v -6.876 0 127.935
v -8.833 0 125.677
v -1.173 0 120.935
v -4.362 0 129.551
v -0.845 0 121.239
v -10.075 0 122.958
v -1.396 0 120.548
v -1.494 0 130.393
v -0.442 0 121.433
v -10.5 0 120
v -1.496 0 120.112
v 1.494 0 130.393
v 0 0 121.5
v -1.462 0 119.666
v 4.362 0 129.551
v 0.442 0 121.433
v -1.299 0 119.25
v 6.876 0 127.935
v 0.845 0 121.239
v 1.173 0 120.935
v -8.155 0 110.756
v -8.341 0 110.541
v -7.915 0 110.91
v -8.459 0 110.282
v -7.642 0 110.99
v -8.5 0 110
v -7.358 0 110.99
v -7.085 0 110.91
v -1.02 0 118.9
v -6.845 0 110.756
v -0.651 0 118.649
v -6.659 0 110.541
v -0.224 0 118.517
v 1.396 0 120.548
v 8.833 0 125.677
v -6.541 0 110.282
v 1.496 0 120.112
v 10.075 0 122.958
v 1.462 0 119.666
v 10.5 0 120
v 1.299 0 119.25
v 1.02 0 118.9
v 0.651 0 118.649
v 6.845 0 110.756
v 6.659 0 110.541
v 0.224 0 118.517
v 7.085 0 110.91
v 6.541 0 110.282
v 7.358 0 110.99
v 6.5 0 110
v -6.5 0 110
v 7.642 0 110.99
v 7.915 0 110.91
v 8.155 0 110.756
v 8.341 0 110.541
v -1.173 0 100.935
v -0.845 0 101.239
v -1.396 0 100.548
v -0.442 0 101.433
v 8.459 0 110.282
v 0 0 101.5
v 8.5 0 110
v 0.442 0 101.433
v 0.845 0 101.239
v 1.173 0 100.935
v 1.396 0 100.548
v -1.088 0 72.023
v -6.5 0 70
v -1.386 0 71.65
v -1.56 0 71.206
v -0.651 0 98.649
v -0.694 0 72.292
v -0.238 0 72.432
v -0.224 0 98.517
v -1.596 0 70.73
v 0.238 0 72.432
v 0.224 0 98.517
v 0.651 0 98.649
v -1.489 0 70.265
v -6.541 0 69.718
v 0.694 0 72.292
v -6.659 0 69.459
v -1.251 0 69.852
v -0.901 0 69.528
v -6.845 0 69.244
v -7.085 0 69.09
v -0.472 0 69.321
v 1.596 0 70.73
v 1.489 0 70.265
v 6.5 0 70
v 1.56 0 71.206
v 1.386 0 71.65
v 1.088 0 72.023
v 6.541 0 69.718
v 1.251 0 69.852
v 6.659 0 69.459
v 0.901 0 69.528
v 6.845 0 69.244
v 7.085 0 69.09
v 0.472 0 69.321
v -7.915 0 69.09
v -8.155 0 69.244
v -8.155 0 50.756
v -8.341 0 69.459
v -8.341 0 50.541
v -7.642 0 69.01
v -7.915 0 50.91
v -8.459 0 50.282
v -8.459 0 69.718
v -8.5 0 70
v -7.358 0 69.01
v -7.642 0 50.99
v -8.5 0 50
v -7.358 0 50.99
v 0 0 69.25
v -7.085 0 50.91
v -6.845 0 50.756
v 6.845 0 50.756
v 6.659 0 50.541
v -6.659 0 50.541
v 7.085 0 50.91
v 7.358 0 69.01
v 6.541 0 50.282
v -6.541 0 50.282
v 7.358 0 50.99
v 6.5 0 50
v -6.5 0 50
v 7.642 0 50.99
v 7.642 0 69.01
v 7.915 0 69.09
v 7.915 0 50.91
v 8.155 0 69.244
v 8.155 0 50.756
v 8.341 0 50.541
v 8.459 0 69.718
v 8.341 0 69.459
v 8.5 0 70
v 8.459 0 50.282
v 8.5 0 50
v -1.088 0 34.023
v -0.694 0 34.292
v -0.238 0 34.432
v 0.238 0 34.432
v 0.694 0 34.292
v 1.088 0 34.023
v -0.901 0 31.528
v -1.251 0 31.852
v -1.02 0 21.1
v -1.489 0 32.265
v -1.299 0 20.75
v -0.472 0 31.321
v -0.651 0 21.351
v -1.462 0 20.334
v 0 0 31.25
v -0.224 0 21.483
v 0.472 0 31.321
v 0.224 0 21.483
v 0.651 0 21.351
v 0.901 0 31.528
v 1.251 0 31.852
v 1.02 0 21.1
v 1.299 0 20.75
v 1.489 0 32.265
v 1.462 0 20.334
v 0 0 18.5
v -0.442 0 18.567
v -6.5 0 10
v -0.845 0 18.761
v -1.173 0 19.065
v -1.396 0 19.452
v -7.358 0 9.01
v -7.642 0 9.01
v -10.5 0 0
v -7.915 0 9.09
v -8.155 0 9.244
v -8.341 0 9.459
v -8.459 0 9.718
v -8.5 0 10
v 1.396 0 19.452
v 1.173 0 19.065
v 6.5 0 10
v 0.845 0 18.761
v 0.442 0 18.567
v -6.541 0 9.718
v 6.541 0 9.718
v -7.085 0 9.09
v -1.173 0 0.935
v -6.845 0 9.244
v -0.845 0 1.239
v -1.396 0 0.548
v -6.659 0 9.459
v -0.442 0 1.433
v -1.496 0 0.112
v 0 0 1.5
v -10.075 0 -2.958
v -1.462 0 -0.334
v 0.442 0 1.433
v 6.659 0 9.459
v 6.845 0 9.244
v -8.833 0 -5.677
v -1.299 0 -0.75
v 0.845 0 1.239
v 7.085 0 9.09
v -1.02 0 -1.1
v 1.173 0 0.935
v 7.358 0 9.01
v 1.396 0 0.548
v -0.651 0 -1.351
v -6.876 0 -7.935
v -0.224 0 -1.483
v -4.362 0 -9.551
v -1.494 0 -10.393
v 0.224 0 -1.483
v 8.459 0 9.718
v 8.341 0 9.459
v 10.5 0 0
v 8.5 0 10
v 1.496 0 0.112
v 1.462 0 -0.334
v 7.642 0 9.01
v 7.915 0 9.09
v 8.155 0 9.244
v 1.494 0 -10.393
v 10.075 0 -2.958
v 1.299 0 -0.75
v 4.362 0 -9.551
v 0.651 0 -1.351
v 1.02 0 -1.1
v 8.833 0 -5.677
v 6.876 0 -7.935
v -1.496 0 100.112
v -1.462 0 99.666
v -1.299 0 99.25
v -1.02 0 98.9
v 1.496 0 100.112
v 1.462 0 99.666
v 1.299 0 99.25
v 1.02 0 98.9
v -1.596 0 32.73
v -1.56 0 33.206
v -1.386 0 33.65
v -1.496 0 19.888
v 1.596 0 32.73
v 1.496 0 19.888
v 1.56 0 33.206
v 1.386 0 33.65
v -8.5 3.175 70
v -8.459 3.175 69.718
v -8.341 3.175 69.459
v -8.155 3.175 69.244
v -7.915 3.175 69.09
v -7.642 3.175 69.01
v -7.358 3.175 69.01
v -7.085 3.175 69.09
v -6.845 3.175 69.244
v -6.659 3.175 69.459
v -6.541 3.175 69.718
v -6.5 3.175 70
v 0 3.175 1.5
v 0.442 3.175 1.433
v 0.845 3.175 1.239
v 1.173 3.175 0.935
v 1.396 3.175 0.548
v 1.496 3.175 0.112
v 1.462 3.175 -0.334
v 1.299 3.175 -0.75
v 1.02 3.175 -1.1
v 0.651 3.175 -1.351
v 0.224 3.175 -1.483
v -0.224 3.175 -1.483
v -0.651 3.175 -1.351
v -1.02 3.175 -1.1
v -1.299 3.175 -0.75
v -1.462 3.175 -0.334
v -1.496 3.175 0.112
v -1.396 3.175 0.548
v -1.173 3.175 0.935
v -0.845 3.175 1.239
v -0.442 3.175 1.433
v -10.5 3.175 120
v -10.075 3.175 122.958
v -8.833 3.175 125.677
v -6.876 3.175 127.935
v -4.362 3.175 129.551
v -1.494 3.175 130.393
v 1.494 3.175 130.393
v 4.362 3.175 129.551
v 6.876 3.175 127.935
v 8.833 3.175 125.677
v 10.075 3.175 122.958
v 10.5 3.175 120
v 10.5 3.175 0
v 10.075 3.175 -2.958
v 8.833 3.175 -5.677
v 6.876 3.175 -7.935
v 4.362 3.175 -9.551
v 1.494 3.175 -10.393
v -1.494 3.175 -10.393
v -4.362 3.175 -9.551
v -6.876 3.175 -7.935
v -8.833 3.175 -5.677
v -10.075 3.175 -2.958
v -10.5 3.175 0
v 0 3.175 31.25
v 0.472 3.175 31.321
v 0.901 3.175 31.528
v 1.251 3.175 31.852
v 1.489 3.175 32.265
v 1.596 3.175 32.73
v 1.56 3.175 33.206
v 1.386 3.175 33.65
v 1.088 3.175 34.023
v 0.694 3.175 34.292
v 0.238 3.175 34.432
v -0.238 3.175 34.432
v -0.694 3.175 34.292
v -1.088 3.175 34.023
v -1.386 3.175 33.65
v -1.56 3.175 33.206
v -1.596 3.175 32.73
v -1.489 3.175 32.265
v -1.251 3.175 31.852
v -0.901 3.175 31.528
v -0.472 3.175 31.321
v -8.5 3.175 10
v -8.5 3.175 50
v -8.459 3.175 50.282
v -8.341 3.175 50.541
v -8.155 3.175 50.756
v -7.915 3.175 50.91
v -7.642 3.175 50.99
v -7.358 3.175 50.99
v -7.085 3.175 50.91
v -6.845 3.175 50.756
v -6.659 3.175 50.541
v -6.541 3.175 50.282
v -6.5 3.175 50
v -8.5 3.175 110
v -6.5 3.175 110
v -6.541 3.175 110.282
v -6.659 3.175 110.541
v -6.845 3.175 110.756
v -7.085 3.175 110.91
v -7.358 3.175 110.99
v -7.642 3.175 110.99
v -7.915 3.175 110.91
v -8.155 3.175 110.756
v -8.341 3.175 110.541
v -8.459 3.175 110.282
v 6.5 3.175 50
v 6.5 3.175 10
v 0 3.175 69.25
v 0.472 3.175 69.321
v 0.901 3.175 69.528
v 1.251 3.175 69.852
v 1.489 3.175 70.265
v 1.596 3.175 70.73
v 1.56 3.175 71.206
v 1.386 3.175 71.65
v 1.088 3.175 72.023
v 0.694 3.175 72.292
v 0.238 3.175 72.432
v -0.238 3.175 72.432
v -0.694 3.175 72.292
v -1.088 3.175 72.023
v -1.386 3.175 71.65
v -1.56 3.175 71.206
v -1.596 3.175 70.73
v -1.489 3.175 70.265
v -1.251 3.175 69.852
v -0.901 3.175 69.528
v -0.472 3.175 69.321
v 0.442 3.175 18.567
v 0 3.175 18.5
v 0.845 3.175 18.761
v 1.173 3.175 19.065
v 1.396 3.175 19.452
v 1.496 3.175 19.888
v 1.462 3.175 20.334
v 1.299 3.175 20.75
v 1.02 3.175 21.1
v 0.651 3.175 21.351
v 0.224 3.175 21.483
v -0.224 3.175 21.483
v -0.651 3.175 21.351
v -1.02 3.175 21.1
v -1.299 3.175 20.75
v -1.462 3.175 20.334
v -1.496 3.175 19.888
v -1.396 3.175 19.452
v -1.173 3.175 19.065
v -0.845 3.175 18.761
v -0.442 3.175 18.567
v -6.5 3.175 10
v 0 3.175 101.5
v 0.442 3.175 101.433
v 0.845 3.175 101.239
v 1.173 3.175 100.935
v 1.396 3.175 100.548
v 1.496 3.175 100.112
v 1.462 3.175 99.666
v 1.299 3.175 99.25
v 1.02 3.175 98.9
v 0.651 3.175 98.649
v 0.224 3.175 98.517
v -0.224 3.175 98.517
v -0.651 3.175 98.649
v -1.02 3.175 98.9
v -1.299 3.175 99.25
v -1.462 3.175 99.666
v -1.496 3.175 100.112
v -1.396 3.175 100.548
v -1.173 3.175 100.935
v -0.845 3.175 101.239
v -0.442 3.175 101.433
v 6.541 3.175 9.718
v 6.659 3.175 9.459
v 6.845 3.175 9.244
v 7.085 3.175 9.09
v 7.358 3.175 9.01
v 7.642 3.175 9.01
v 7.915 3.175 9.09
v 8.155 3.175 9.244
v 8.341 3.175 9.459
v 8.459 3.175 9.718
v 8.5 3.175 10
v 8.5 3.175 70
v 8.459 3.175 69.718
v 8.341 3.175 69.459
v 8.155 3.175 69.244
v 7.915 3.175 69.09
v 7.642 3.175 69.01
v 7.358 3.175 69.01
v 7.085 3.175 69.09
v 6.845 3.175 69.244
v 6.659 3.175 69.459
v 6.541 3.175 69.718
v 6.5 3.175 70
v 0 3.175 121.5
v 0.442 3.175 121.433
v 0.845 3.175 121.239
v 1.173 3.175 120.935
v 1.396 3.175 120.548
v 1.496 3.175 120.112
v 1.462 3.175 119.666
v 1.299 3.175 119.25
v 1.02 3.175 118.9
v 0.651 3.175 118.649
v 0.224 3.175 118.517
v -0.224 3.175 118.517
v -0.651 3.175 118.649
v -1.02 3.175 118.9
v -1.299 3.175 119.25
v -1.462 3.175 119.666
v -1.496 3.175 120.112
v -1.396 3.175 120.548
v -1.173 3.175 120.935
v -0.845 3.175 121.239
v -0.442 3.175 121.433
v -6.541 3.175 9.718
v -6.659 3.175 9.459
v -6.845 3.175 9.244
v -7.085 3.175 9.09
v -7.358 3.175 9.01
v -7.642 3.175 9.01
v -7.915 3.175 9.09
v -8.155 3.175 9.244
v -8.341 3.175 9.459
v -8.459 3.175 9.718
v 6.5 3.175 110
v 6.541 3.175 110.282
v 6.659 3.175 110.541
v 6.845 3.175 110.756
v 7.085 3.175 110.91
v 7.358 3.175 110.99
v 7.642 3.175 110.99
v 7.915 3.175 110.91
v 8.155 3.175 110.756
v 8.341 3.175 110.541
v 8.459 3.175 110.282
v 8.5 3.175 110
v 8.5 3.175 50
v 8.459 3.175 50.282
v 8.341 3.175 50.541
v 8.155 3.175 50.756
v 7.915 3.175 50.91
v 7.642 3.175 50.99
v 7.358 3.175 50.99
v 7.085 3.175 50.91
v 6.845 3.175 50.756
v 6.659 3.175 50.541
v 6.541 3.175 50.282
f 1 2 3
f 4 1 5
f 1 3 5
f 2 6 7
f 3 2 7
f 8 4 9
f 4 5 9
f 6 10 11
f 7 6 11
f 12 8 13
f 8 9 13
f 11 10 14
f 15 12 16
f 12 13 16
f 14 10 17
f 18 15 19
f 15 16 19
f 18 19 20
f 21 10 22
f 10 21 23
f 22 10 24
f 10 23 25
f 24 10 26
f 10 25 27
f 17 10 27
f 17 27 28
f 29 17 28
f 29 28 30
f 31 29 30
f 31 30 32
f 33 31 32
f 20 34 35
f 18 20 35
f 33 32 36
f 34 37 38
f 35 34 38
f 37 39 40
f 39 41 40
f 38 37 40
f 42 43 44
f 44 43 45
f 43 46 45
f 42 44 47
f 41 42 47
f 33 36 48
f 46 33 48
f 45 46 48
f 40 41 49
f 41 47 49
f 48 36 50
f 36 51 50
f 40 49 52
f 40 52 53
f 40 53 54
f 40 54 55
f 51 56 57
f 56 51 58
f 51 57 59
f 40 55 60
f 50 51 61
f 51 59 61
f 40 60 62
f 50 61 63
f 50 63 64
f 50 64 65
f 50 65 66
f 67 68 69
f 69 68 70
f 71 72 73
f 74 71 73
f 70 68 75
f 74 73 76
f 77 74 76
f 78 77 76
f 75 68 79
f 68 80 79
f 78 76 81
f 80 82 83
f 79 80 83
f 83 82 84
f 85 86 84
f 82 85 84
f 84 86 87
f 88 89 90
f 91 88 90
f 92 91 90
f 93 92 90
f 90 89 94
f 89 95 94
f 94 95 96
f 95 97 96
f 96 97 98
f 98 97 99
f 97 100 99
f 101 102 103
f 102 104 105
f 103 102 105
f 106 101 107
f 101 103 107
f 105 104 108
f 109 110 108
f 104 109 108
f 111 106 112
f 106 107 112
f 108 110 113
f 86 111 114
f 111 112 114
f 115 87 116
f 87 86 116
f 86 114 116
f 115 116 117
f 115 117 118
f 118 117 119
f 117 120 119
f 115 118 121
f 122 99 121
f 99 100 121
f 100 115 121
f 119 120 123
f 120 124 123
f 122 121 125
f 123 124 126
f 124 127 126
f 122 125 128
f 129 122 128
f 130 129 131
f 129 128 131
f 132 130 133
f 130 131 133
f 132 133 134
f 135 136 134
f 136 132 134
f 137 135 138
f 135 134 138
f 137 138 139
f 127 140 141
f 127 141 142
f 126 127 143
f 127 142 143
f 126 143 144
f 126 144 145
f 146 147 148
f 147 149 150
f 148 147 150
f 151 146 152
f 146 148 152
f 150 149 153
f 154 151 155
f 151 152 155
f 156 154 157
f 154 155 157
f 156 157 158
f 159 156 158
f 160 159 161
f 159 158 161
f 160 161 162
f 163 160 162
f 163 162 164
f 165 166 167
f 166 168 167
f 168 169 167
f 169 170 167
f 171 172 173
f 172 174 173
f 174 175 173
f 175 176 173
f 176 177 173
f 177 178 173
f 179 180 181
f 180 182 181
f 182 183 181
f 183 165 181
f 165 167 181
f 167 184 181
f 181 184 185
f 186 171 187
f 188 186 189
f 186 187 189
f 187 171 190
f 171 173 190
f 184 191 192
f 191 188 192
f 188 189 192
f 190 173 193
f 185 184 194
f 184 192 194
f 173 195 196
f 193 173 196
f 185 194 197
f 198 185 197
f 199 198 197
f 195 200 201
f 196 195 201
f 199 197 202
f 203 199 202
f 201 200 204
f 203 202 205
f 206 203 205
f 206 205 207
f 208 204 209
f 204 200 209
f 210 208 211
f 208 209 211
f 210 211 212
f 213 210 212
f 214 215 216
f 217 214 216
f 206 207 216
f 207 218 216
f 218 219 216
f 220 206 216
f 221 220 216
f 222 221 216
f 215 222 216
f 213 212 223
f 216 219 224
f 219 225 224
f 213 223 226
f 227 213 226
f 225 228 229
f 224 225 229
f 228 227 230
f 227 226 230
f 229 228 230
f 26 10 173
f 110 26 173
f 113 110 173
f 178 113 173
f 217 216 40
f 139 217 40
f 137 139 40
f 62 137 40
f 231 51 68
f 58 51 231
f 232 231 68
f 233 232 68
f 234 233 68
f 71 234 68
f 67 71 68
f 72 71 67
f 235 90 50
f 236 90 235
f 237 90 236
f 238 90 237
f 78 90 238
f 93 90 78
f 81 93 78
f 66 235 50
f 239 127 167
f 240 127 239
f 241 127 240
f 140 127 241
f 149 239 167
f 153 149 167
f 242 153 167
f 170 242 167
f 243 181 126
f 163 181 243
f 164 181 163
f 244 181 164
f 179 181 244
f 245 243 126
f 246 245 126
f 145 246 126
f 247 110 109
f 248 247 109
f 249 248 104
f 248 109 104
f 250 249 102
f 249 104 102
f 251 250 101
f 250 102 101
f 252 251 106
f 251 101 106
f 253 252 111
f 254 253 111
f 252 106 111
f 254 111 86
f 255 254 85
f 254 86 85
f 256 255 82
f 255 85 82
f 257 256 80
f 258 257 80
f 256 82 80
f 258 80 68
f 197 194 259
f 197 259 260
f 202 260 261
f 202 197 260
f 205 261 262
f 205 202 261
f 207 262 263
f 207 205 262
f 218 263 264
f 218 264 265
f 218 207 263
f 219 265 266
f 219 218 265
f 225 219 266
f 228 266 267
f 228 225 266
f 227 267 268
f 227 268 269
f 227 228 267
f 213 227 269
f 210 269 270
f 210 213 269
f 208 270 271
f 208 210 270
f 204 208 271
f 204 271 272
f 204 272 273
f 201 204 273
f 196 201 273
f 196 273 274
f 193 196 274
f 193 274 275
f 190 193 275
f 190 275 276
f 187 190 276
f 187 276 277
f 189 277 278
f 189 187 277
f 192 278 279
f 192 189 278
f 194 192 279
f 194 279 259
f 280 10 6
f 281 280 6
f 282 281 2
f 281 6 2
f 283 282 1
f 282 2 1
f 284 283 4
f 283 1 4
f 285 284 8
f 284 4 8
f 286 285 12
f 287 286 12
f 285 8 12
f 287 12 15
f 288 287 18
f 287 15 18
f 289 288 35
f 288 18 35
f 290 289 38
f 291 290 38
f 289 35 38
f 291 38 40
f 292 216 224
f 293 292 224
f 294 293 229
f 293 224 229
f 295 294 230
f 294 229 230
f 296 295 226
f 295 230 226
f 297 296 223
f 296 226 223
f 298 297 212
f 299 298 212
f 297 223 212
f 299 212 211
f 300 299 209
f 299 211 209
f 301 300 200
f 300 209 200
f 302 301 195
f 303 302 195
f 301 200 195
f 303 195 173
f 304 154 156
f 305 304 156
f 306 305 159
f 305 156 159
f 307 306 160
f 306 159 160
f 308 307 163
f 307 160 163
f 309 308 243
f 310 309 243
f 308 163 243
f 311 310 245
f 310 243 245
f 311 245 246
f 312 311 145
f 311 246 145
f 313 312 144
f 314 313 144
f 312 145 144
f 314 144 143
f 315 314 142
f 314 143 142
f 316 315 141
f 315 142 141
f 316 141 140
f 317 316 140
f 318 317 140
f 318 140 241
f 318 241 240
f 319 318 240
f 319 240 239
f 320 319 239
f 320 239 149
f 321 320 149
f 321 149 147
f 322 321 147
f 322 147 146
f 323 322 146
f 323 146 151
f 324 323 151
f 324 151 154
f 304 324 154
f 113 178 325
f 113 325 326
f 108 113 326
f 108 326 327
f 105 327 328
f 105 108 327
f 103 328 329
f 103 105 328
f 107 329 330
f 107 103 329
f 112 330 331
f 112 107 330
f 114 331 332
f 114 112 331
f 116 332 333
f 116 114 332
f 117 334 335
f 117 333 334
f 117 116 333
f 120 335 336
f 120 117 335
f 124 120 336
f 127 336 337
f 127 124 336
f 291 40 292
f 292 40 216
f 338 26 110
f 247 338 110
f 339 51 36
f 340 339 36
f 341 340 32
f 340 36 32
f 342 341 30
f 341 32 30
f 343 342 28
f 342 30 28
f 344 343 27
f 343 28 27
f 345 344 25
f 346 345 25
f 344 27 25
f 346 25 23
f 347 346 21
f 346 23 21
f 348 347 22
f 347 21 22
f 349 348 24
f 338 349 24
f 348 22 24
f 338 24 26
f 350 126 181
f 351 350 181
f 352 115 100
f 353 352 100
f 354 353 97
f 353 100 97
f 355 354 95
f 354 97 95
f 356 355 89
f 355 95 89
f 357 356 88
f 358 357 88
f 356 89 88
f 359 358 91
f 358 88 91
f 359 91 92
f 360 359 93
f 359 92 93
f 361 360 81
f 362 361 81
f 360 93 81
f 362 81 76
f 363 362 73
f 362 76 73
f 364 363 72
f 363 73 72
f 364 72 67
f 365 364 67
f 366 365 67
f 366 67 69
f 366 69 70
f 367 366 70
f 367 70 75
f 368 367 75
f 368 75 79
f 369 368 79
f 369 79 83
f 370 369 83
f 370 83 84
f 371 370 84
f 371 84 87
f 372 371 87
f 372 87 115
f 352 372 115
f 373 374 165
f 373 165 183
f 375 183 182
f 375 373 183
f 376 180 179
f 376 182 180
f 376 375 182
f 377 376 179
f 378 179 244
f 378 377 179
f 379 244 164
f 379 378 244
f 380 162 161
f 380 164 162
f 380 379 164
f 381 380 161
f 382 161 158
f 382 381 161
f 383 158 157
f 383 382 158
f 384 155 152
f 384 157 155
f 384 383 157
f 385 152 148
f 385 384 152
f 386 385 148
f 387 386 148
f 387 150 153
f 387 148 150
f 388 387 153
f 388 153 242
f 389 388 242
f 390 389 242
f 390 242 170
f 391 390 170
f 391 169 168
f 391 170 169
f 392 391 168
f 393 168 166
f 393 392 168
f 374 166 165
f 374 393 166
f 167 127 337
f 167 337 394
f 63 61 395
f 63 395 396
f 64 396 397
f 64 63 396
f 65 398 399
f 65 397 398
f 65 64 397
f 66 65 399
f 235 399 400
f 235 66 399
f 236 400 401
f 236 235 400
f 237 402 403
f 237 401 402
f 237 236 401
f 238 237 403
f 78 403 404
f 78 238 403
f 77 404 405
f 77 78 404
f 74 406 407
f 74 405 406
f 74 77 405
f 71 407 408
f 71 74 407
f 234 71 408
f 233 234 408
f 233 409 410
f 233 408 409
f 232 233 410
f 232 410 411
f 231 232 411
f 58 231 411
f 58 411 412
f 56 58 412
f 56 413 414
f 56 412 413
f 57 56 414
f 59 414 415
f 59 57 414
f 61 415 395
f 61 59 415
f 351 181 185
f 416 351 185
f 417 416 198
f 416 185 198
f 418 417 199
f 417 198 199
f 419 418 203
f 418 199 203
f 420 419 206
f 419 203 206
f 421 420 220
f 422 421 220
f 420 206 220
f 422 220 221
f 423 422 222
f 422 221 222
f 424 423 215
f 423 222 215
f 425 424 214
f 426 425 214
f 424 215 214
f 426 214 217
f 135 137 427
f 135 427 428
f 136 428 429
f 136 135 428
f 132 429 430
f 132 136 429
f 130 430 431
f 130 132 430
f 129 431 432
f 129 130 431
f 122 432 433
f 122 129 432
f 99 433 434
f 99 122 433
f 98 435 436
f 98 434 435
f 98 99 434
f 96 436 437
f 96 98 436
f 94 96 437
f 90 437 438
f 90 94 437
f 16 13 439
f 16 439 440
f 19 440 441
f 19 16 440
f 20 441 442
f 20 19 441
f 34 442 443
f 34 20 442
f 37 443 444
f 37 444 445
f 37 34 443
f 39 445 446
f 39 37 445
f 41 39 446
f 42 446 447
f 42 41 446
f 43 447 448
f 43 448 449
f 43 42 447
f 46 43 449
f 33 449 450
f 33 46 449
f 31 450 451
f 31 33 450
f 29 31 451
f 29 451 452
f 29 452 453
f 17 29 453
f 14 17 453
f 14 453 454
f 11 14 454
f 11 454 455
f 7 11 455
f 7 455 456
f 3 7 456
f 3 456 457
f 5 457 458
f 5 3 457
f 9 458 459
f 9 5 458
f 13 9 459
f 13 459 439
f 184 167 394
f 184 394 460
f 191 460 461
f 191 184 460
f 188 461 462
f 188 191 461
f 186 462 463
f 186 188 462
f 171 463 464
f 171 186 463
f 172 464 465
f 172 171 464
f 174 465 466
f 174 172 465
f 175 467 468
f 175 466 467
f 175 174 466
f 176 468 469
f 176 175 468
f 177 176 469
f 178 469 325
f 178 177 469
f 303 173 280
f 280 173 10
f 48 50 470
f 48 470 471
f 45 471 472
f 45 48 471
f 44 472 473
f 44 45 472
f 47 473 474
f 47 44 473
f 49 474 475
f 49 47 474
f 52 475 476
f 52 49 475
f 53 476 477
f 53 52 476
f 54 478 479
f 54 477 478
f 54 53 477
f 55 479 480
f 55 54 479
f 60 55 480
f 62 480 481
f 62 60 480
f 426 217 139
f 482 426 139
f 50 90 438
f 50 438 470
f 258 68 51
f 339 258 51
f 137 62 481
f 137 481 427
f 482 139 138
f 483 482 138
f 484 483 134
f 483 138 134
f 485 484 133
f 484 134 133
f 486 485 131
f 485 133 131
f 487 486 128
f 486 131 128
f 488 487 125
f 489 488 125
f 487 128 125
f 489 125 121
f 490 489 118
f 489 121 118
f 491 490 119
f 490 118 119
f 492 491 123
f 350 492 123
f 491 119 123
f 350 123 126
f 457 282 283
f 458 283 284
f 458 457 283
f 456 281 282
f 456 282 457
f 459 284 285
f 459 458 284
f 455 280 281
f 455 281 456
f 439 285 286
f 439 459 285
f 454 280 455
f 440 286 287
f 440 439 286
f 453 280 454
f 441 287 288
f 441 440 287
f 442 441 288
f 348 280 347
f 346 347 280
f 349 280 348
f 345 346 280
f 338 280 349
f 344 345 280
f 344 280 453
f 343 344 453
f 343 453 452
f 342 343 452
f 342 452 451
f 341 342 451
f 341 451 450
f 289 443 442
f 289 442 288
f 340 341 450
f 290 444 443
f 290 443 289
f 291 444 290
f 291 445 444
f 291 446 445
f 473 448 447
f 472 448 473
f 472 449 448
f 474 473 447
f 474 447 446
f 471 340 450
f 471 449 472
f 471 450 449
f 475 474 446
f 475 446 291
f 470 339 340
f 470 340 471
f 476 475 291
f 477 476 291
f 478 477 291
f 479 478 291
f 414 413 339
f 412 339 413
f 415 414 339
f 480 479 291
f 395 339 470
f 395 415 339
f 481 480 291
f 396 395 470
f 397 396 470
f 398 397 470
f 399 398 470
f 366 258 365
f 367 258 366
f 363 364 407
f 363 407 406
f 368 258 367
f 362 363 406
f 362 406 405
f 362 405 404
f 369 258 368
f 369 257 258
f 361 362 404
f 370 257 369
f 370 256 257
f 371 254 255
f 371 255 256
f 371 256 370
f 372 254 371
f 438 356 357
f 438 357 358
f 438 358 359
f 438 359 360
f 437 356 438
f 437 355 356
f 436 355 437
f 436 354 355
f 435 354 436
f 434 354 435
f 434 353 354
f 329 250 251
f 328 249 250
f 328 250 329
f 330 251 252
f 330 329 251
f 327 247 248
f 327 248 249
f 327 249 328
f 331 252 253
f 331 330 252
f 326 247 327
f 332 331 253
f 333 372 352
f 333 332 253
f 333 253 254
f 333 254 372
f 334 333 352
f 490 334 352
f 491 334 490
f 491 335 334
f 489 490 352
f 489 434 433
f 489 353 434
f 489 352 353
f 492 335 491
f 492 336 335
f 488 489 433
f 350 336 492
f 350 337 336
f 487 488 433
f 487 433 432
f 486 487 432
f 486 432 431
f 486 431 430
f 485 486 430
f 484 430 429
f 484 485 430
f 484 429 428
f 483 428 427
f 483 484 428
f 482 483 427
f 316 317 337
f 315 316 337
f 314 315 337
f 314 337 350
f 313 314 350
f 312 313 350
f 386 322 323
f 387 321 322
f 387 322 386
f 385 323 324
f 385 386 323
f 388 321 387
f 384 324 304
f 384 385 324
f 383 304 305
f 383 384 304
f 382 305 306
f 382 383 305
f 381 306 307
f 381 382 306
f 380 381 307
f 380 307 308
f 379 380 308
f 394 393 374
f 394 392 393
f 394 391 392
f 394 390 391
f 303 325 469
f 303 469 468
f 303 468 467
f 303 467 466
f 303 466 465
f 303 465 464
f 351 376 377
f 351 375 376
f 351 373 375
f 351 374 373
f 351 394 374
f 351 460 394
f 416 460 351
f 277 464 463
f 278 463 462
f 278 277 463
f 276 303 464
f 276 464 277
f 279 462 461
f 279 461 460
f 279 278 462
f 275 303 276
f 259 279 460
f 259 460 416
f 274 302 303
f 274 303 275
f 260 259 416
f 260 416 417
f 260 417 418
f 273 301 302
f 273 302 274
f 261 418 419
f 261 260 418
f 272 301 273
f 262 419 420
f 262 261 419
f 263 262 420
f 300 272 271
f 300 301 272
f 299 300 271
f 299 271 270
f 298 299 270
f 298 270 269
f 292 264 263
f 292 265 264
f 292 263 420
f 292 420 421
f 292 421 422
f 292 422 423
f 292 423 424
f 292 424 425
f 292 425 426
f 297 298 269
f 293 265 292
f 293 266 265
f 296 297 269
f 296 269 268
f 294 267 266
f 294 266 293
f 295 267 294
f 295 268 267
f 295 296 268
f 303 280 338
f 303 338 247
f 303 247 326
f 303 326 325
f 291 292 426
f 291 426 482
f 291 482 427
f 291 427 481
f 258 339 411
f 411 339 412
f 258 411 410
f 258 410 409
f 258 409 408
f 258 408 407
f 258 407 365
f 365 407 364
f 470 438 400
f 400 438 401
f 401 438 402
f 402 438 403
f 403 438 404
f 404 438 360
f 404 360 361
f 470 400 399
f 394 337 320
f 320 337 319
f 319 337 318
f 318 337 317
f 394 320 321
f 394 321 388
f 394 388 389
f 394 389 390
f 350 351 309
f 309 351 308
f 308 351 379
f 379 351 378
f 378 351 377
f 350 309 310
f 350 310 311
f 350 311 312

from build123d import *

# Parameters (mm, degrees)
SKETCH1_R               = 1.5
BOSS_EXTRUDE1_DEPTH     = 3.175
CUT_EXTRUDE1_DEPTH      = 131.960225355
CUT_EXTRUDE1_DEPTH_BACK = 131.960225355
SKETCH2_R               = 1.5
CUT_EXTRUDE2_DEPTH      = 131.960225355
CUT_EXTRUDE2_DEPTH_BACK = 131.960225355
SKETCH3_R               = 1.5
CUT_EXTRUDE4_DEPTH      = 40
SKETCH6_R               = 1.6
CUT_EXTRUDE5_DEPTH      = 10


with BuildPart() as part:
    # Sketch1 → Boss-Extrude1 (new body)
    with BuildSketch(Plane(origin=(0, 0, 0), x_dir=(1, 0, 0), z_dir=(0, 1, 0))):
        with BuildLine():
            Line((-10.5, 0), (-10.5, -120))
            ThreePointArc((-10.5, -120), (0, -130.5), (10.5, -120))
            Line((10.5, -120), (10.5, 0))
            ThreePointArc((10.5, 0), (0, 10.5), (-10.5, 0))
        make_face()
        with Locations(Location((0, 0, 0), (0, 0, 270))):
            Circle(SKETCH1_R, mode=Mode.SUBTRACT)
        with Locations(Location((0, -120, 0), (0, 0, 270))):
            Circle(SKETCH1_R, mode=Mode.SUBTRACT)
    extrude(amount=BOSS_EXTRUDE1_DEPTH)

    # Sketch2 → Cut-Extrude1 (cut, two sides: drawn at the far end of the back side and taken through both)
    with BuildSketch(Plane.XZ.offset(-CUT_EXTRUDE1_DEPTH_BACK)):
        with Locations(Location((0, 20, 0), (0, 0, 270))):
            Circle(SKETCH2_R)
    extrude(amount=CUT_EXTRUDE1_DEPTH + CUT_EXTRUDE1_DEPTH_BACK, mode=Mode.SUBTRACT)

    # Sketch3 → Cut-Extrude2 (cut, two sides: drawn at the far end of the back side and taken through both)
    with BuildSketch(Plane(origin=(0, 3.175, 0), x_dir=(1, 0, 0), z_dir=(0, 1, 0)).offset(-CUT_EXTRUDE2_DEPTH_BACK)):
        with Locations(Location((0, -100, 0), (0, 0, 270))):
            Circle(SKETCH3_R)
    extrude(amount=CUT_EXTRUDE2_DEPTH + CUT_EXTRUDE2_DEPTH_BACK, mode=Mode.SUBTRACT)

    # Sketch5 → Cut-Extrude4 (cut)
    with BuildSketch(Plane.XZ):
        with BuildLine():
            Line((-8.5, 10), (-8.5, 50))
            ThreePointArc((-8.5, 50), (-7.5, 51), (-6.5, 50))
            Line((-6.5, 50), (-6.5, 10))
            ThreePointArc((-6.5, 10), (-7.5, 9), (-8.5, 10))
        make_face()
        with BuildLine():
            Line((6.5, 50), (6.5, 10))
            ThreePointArc((6.5, 10), (7.5, 9), (8.5, 10))
            Line((8.5, 10), (8.5, 50))
            ThreePointArc((8.5, 50), (7.5, 51), (6.5, 50))
        make_face()
        with BuildLine():
            Line((8.5, 110), (8.5, 70))
            ThreePointArc((8.5, 70), (7.5, 69), (6.5, 70))
            Line((6.5, 70), (6.5, 110))
            ThreePointArc((6.5, 110), (7.5, 111), (8.5, 110))
        make_face()
        with BuildLine():
            Line((-6.5, 70), (-6.5, 110))
            ThreePointArc((-6.5, 110), (-7.5, 111), (-8.5, 110))
            Line((-8.5, 110), (-8.5, 70))
            ThreePointArc((-8.5, 70), (-7.5, 69), (-6.5, 70))
        make_face()
    extrude(amount=-CUT_EXTRUDE4_DEPTH, mode=Mode.SUBTRACT)

    # Sketch6 → Cut-Extrude5 (cut)
    with BuildSketch(Plane.XZ):
        with Locations(Location((0, 70.85, 0), (0, 0, 270))):
            Circle(SKETCH6_R)
        with Locations(Location((0, 32.85, 0), (0, 0, 270))):
            Circle(SKETCH6_R)
    extrude(amount=-CUT_EXTRUDE5_DEPTH, mode=Mode.SUBTRACT)


solid = part.part
